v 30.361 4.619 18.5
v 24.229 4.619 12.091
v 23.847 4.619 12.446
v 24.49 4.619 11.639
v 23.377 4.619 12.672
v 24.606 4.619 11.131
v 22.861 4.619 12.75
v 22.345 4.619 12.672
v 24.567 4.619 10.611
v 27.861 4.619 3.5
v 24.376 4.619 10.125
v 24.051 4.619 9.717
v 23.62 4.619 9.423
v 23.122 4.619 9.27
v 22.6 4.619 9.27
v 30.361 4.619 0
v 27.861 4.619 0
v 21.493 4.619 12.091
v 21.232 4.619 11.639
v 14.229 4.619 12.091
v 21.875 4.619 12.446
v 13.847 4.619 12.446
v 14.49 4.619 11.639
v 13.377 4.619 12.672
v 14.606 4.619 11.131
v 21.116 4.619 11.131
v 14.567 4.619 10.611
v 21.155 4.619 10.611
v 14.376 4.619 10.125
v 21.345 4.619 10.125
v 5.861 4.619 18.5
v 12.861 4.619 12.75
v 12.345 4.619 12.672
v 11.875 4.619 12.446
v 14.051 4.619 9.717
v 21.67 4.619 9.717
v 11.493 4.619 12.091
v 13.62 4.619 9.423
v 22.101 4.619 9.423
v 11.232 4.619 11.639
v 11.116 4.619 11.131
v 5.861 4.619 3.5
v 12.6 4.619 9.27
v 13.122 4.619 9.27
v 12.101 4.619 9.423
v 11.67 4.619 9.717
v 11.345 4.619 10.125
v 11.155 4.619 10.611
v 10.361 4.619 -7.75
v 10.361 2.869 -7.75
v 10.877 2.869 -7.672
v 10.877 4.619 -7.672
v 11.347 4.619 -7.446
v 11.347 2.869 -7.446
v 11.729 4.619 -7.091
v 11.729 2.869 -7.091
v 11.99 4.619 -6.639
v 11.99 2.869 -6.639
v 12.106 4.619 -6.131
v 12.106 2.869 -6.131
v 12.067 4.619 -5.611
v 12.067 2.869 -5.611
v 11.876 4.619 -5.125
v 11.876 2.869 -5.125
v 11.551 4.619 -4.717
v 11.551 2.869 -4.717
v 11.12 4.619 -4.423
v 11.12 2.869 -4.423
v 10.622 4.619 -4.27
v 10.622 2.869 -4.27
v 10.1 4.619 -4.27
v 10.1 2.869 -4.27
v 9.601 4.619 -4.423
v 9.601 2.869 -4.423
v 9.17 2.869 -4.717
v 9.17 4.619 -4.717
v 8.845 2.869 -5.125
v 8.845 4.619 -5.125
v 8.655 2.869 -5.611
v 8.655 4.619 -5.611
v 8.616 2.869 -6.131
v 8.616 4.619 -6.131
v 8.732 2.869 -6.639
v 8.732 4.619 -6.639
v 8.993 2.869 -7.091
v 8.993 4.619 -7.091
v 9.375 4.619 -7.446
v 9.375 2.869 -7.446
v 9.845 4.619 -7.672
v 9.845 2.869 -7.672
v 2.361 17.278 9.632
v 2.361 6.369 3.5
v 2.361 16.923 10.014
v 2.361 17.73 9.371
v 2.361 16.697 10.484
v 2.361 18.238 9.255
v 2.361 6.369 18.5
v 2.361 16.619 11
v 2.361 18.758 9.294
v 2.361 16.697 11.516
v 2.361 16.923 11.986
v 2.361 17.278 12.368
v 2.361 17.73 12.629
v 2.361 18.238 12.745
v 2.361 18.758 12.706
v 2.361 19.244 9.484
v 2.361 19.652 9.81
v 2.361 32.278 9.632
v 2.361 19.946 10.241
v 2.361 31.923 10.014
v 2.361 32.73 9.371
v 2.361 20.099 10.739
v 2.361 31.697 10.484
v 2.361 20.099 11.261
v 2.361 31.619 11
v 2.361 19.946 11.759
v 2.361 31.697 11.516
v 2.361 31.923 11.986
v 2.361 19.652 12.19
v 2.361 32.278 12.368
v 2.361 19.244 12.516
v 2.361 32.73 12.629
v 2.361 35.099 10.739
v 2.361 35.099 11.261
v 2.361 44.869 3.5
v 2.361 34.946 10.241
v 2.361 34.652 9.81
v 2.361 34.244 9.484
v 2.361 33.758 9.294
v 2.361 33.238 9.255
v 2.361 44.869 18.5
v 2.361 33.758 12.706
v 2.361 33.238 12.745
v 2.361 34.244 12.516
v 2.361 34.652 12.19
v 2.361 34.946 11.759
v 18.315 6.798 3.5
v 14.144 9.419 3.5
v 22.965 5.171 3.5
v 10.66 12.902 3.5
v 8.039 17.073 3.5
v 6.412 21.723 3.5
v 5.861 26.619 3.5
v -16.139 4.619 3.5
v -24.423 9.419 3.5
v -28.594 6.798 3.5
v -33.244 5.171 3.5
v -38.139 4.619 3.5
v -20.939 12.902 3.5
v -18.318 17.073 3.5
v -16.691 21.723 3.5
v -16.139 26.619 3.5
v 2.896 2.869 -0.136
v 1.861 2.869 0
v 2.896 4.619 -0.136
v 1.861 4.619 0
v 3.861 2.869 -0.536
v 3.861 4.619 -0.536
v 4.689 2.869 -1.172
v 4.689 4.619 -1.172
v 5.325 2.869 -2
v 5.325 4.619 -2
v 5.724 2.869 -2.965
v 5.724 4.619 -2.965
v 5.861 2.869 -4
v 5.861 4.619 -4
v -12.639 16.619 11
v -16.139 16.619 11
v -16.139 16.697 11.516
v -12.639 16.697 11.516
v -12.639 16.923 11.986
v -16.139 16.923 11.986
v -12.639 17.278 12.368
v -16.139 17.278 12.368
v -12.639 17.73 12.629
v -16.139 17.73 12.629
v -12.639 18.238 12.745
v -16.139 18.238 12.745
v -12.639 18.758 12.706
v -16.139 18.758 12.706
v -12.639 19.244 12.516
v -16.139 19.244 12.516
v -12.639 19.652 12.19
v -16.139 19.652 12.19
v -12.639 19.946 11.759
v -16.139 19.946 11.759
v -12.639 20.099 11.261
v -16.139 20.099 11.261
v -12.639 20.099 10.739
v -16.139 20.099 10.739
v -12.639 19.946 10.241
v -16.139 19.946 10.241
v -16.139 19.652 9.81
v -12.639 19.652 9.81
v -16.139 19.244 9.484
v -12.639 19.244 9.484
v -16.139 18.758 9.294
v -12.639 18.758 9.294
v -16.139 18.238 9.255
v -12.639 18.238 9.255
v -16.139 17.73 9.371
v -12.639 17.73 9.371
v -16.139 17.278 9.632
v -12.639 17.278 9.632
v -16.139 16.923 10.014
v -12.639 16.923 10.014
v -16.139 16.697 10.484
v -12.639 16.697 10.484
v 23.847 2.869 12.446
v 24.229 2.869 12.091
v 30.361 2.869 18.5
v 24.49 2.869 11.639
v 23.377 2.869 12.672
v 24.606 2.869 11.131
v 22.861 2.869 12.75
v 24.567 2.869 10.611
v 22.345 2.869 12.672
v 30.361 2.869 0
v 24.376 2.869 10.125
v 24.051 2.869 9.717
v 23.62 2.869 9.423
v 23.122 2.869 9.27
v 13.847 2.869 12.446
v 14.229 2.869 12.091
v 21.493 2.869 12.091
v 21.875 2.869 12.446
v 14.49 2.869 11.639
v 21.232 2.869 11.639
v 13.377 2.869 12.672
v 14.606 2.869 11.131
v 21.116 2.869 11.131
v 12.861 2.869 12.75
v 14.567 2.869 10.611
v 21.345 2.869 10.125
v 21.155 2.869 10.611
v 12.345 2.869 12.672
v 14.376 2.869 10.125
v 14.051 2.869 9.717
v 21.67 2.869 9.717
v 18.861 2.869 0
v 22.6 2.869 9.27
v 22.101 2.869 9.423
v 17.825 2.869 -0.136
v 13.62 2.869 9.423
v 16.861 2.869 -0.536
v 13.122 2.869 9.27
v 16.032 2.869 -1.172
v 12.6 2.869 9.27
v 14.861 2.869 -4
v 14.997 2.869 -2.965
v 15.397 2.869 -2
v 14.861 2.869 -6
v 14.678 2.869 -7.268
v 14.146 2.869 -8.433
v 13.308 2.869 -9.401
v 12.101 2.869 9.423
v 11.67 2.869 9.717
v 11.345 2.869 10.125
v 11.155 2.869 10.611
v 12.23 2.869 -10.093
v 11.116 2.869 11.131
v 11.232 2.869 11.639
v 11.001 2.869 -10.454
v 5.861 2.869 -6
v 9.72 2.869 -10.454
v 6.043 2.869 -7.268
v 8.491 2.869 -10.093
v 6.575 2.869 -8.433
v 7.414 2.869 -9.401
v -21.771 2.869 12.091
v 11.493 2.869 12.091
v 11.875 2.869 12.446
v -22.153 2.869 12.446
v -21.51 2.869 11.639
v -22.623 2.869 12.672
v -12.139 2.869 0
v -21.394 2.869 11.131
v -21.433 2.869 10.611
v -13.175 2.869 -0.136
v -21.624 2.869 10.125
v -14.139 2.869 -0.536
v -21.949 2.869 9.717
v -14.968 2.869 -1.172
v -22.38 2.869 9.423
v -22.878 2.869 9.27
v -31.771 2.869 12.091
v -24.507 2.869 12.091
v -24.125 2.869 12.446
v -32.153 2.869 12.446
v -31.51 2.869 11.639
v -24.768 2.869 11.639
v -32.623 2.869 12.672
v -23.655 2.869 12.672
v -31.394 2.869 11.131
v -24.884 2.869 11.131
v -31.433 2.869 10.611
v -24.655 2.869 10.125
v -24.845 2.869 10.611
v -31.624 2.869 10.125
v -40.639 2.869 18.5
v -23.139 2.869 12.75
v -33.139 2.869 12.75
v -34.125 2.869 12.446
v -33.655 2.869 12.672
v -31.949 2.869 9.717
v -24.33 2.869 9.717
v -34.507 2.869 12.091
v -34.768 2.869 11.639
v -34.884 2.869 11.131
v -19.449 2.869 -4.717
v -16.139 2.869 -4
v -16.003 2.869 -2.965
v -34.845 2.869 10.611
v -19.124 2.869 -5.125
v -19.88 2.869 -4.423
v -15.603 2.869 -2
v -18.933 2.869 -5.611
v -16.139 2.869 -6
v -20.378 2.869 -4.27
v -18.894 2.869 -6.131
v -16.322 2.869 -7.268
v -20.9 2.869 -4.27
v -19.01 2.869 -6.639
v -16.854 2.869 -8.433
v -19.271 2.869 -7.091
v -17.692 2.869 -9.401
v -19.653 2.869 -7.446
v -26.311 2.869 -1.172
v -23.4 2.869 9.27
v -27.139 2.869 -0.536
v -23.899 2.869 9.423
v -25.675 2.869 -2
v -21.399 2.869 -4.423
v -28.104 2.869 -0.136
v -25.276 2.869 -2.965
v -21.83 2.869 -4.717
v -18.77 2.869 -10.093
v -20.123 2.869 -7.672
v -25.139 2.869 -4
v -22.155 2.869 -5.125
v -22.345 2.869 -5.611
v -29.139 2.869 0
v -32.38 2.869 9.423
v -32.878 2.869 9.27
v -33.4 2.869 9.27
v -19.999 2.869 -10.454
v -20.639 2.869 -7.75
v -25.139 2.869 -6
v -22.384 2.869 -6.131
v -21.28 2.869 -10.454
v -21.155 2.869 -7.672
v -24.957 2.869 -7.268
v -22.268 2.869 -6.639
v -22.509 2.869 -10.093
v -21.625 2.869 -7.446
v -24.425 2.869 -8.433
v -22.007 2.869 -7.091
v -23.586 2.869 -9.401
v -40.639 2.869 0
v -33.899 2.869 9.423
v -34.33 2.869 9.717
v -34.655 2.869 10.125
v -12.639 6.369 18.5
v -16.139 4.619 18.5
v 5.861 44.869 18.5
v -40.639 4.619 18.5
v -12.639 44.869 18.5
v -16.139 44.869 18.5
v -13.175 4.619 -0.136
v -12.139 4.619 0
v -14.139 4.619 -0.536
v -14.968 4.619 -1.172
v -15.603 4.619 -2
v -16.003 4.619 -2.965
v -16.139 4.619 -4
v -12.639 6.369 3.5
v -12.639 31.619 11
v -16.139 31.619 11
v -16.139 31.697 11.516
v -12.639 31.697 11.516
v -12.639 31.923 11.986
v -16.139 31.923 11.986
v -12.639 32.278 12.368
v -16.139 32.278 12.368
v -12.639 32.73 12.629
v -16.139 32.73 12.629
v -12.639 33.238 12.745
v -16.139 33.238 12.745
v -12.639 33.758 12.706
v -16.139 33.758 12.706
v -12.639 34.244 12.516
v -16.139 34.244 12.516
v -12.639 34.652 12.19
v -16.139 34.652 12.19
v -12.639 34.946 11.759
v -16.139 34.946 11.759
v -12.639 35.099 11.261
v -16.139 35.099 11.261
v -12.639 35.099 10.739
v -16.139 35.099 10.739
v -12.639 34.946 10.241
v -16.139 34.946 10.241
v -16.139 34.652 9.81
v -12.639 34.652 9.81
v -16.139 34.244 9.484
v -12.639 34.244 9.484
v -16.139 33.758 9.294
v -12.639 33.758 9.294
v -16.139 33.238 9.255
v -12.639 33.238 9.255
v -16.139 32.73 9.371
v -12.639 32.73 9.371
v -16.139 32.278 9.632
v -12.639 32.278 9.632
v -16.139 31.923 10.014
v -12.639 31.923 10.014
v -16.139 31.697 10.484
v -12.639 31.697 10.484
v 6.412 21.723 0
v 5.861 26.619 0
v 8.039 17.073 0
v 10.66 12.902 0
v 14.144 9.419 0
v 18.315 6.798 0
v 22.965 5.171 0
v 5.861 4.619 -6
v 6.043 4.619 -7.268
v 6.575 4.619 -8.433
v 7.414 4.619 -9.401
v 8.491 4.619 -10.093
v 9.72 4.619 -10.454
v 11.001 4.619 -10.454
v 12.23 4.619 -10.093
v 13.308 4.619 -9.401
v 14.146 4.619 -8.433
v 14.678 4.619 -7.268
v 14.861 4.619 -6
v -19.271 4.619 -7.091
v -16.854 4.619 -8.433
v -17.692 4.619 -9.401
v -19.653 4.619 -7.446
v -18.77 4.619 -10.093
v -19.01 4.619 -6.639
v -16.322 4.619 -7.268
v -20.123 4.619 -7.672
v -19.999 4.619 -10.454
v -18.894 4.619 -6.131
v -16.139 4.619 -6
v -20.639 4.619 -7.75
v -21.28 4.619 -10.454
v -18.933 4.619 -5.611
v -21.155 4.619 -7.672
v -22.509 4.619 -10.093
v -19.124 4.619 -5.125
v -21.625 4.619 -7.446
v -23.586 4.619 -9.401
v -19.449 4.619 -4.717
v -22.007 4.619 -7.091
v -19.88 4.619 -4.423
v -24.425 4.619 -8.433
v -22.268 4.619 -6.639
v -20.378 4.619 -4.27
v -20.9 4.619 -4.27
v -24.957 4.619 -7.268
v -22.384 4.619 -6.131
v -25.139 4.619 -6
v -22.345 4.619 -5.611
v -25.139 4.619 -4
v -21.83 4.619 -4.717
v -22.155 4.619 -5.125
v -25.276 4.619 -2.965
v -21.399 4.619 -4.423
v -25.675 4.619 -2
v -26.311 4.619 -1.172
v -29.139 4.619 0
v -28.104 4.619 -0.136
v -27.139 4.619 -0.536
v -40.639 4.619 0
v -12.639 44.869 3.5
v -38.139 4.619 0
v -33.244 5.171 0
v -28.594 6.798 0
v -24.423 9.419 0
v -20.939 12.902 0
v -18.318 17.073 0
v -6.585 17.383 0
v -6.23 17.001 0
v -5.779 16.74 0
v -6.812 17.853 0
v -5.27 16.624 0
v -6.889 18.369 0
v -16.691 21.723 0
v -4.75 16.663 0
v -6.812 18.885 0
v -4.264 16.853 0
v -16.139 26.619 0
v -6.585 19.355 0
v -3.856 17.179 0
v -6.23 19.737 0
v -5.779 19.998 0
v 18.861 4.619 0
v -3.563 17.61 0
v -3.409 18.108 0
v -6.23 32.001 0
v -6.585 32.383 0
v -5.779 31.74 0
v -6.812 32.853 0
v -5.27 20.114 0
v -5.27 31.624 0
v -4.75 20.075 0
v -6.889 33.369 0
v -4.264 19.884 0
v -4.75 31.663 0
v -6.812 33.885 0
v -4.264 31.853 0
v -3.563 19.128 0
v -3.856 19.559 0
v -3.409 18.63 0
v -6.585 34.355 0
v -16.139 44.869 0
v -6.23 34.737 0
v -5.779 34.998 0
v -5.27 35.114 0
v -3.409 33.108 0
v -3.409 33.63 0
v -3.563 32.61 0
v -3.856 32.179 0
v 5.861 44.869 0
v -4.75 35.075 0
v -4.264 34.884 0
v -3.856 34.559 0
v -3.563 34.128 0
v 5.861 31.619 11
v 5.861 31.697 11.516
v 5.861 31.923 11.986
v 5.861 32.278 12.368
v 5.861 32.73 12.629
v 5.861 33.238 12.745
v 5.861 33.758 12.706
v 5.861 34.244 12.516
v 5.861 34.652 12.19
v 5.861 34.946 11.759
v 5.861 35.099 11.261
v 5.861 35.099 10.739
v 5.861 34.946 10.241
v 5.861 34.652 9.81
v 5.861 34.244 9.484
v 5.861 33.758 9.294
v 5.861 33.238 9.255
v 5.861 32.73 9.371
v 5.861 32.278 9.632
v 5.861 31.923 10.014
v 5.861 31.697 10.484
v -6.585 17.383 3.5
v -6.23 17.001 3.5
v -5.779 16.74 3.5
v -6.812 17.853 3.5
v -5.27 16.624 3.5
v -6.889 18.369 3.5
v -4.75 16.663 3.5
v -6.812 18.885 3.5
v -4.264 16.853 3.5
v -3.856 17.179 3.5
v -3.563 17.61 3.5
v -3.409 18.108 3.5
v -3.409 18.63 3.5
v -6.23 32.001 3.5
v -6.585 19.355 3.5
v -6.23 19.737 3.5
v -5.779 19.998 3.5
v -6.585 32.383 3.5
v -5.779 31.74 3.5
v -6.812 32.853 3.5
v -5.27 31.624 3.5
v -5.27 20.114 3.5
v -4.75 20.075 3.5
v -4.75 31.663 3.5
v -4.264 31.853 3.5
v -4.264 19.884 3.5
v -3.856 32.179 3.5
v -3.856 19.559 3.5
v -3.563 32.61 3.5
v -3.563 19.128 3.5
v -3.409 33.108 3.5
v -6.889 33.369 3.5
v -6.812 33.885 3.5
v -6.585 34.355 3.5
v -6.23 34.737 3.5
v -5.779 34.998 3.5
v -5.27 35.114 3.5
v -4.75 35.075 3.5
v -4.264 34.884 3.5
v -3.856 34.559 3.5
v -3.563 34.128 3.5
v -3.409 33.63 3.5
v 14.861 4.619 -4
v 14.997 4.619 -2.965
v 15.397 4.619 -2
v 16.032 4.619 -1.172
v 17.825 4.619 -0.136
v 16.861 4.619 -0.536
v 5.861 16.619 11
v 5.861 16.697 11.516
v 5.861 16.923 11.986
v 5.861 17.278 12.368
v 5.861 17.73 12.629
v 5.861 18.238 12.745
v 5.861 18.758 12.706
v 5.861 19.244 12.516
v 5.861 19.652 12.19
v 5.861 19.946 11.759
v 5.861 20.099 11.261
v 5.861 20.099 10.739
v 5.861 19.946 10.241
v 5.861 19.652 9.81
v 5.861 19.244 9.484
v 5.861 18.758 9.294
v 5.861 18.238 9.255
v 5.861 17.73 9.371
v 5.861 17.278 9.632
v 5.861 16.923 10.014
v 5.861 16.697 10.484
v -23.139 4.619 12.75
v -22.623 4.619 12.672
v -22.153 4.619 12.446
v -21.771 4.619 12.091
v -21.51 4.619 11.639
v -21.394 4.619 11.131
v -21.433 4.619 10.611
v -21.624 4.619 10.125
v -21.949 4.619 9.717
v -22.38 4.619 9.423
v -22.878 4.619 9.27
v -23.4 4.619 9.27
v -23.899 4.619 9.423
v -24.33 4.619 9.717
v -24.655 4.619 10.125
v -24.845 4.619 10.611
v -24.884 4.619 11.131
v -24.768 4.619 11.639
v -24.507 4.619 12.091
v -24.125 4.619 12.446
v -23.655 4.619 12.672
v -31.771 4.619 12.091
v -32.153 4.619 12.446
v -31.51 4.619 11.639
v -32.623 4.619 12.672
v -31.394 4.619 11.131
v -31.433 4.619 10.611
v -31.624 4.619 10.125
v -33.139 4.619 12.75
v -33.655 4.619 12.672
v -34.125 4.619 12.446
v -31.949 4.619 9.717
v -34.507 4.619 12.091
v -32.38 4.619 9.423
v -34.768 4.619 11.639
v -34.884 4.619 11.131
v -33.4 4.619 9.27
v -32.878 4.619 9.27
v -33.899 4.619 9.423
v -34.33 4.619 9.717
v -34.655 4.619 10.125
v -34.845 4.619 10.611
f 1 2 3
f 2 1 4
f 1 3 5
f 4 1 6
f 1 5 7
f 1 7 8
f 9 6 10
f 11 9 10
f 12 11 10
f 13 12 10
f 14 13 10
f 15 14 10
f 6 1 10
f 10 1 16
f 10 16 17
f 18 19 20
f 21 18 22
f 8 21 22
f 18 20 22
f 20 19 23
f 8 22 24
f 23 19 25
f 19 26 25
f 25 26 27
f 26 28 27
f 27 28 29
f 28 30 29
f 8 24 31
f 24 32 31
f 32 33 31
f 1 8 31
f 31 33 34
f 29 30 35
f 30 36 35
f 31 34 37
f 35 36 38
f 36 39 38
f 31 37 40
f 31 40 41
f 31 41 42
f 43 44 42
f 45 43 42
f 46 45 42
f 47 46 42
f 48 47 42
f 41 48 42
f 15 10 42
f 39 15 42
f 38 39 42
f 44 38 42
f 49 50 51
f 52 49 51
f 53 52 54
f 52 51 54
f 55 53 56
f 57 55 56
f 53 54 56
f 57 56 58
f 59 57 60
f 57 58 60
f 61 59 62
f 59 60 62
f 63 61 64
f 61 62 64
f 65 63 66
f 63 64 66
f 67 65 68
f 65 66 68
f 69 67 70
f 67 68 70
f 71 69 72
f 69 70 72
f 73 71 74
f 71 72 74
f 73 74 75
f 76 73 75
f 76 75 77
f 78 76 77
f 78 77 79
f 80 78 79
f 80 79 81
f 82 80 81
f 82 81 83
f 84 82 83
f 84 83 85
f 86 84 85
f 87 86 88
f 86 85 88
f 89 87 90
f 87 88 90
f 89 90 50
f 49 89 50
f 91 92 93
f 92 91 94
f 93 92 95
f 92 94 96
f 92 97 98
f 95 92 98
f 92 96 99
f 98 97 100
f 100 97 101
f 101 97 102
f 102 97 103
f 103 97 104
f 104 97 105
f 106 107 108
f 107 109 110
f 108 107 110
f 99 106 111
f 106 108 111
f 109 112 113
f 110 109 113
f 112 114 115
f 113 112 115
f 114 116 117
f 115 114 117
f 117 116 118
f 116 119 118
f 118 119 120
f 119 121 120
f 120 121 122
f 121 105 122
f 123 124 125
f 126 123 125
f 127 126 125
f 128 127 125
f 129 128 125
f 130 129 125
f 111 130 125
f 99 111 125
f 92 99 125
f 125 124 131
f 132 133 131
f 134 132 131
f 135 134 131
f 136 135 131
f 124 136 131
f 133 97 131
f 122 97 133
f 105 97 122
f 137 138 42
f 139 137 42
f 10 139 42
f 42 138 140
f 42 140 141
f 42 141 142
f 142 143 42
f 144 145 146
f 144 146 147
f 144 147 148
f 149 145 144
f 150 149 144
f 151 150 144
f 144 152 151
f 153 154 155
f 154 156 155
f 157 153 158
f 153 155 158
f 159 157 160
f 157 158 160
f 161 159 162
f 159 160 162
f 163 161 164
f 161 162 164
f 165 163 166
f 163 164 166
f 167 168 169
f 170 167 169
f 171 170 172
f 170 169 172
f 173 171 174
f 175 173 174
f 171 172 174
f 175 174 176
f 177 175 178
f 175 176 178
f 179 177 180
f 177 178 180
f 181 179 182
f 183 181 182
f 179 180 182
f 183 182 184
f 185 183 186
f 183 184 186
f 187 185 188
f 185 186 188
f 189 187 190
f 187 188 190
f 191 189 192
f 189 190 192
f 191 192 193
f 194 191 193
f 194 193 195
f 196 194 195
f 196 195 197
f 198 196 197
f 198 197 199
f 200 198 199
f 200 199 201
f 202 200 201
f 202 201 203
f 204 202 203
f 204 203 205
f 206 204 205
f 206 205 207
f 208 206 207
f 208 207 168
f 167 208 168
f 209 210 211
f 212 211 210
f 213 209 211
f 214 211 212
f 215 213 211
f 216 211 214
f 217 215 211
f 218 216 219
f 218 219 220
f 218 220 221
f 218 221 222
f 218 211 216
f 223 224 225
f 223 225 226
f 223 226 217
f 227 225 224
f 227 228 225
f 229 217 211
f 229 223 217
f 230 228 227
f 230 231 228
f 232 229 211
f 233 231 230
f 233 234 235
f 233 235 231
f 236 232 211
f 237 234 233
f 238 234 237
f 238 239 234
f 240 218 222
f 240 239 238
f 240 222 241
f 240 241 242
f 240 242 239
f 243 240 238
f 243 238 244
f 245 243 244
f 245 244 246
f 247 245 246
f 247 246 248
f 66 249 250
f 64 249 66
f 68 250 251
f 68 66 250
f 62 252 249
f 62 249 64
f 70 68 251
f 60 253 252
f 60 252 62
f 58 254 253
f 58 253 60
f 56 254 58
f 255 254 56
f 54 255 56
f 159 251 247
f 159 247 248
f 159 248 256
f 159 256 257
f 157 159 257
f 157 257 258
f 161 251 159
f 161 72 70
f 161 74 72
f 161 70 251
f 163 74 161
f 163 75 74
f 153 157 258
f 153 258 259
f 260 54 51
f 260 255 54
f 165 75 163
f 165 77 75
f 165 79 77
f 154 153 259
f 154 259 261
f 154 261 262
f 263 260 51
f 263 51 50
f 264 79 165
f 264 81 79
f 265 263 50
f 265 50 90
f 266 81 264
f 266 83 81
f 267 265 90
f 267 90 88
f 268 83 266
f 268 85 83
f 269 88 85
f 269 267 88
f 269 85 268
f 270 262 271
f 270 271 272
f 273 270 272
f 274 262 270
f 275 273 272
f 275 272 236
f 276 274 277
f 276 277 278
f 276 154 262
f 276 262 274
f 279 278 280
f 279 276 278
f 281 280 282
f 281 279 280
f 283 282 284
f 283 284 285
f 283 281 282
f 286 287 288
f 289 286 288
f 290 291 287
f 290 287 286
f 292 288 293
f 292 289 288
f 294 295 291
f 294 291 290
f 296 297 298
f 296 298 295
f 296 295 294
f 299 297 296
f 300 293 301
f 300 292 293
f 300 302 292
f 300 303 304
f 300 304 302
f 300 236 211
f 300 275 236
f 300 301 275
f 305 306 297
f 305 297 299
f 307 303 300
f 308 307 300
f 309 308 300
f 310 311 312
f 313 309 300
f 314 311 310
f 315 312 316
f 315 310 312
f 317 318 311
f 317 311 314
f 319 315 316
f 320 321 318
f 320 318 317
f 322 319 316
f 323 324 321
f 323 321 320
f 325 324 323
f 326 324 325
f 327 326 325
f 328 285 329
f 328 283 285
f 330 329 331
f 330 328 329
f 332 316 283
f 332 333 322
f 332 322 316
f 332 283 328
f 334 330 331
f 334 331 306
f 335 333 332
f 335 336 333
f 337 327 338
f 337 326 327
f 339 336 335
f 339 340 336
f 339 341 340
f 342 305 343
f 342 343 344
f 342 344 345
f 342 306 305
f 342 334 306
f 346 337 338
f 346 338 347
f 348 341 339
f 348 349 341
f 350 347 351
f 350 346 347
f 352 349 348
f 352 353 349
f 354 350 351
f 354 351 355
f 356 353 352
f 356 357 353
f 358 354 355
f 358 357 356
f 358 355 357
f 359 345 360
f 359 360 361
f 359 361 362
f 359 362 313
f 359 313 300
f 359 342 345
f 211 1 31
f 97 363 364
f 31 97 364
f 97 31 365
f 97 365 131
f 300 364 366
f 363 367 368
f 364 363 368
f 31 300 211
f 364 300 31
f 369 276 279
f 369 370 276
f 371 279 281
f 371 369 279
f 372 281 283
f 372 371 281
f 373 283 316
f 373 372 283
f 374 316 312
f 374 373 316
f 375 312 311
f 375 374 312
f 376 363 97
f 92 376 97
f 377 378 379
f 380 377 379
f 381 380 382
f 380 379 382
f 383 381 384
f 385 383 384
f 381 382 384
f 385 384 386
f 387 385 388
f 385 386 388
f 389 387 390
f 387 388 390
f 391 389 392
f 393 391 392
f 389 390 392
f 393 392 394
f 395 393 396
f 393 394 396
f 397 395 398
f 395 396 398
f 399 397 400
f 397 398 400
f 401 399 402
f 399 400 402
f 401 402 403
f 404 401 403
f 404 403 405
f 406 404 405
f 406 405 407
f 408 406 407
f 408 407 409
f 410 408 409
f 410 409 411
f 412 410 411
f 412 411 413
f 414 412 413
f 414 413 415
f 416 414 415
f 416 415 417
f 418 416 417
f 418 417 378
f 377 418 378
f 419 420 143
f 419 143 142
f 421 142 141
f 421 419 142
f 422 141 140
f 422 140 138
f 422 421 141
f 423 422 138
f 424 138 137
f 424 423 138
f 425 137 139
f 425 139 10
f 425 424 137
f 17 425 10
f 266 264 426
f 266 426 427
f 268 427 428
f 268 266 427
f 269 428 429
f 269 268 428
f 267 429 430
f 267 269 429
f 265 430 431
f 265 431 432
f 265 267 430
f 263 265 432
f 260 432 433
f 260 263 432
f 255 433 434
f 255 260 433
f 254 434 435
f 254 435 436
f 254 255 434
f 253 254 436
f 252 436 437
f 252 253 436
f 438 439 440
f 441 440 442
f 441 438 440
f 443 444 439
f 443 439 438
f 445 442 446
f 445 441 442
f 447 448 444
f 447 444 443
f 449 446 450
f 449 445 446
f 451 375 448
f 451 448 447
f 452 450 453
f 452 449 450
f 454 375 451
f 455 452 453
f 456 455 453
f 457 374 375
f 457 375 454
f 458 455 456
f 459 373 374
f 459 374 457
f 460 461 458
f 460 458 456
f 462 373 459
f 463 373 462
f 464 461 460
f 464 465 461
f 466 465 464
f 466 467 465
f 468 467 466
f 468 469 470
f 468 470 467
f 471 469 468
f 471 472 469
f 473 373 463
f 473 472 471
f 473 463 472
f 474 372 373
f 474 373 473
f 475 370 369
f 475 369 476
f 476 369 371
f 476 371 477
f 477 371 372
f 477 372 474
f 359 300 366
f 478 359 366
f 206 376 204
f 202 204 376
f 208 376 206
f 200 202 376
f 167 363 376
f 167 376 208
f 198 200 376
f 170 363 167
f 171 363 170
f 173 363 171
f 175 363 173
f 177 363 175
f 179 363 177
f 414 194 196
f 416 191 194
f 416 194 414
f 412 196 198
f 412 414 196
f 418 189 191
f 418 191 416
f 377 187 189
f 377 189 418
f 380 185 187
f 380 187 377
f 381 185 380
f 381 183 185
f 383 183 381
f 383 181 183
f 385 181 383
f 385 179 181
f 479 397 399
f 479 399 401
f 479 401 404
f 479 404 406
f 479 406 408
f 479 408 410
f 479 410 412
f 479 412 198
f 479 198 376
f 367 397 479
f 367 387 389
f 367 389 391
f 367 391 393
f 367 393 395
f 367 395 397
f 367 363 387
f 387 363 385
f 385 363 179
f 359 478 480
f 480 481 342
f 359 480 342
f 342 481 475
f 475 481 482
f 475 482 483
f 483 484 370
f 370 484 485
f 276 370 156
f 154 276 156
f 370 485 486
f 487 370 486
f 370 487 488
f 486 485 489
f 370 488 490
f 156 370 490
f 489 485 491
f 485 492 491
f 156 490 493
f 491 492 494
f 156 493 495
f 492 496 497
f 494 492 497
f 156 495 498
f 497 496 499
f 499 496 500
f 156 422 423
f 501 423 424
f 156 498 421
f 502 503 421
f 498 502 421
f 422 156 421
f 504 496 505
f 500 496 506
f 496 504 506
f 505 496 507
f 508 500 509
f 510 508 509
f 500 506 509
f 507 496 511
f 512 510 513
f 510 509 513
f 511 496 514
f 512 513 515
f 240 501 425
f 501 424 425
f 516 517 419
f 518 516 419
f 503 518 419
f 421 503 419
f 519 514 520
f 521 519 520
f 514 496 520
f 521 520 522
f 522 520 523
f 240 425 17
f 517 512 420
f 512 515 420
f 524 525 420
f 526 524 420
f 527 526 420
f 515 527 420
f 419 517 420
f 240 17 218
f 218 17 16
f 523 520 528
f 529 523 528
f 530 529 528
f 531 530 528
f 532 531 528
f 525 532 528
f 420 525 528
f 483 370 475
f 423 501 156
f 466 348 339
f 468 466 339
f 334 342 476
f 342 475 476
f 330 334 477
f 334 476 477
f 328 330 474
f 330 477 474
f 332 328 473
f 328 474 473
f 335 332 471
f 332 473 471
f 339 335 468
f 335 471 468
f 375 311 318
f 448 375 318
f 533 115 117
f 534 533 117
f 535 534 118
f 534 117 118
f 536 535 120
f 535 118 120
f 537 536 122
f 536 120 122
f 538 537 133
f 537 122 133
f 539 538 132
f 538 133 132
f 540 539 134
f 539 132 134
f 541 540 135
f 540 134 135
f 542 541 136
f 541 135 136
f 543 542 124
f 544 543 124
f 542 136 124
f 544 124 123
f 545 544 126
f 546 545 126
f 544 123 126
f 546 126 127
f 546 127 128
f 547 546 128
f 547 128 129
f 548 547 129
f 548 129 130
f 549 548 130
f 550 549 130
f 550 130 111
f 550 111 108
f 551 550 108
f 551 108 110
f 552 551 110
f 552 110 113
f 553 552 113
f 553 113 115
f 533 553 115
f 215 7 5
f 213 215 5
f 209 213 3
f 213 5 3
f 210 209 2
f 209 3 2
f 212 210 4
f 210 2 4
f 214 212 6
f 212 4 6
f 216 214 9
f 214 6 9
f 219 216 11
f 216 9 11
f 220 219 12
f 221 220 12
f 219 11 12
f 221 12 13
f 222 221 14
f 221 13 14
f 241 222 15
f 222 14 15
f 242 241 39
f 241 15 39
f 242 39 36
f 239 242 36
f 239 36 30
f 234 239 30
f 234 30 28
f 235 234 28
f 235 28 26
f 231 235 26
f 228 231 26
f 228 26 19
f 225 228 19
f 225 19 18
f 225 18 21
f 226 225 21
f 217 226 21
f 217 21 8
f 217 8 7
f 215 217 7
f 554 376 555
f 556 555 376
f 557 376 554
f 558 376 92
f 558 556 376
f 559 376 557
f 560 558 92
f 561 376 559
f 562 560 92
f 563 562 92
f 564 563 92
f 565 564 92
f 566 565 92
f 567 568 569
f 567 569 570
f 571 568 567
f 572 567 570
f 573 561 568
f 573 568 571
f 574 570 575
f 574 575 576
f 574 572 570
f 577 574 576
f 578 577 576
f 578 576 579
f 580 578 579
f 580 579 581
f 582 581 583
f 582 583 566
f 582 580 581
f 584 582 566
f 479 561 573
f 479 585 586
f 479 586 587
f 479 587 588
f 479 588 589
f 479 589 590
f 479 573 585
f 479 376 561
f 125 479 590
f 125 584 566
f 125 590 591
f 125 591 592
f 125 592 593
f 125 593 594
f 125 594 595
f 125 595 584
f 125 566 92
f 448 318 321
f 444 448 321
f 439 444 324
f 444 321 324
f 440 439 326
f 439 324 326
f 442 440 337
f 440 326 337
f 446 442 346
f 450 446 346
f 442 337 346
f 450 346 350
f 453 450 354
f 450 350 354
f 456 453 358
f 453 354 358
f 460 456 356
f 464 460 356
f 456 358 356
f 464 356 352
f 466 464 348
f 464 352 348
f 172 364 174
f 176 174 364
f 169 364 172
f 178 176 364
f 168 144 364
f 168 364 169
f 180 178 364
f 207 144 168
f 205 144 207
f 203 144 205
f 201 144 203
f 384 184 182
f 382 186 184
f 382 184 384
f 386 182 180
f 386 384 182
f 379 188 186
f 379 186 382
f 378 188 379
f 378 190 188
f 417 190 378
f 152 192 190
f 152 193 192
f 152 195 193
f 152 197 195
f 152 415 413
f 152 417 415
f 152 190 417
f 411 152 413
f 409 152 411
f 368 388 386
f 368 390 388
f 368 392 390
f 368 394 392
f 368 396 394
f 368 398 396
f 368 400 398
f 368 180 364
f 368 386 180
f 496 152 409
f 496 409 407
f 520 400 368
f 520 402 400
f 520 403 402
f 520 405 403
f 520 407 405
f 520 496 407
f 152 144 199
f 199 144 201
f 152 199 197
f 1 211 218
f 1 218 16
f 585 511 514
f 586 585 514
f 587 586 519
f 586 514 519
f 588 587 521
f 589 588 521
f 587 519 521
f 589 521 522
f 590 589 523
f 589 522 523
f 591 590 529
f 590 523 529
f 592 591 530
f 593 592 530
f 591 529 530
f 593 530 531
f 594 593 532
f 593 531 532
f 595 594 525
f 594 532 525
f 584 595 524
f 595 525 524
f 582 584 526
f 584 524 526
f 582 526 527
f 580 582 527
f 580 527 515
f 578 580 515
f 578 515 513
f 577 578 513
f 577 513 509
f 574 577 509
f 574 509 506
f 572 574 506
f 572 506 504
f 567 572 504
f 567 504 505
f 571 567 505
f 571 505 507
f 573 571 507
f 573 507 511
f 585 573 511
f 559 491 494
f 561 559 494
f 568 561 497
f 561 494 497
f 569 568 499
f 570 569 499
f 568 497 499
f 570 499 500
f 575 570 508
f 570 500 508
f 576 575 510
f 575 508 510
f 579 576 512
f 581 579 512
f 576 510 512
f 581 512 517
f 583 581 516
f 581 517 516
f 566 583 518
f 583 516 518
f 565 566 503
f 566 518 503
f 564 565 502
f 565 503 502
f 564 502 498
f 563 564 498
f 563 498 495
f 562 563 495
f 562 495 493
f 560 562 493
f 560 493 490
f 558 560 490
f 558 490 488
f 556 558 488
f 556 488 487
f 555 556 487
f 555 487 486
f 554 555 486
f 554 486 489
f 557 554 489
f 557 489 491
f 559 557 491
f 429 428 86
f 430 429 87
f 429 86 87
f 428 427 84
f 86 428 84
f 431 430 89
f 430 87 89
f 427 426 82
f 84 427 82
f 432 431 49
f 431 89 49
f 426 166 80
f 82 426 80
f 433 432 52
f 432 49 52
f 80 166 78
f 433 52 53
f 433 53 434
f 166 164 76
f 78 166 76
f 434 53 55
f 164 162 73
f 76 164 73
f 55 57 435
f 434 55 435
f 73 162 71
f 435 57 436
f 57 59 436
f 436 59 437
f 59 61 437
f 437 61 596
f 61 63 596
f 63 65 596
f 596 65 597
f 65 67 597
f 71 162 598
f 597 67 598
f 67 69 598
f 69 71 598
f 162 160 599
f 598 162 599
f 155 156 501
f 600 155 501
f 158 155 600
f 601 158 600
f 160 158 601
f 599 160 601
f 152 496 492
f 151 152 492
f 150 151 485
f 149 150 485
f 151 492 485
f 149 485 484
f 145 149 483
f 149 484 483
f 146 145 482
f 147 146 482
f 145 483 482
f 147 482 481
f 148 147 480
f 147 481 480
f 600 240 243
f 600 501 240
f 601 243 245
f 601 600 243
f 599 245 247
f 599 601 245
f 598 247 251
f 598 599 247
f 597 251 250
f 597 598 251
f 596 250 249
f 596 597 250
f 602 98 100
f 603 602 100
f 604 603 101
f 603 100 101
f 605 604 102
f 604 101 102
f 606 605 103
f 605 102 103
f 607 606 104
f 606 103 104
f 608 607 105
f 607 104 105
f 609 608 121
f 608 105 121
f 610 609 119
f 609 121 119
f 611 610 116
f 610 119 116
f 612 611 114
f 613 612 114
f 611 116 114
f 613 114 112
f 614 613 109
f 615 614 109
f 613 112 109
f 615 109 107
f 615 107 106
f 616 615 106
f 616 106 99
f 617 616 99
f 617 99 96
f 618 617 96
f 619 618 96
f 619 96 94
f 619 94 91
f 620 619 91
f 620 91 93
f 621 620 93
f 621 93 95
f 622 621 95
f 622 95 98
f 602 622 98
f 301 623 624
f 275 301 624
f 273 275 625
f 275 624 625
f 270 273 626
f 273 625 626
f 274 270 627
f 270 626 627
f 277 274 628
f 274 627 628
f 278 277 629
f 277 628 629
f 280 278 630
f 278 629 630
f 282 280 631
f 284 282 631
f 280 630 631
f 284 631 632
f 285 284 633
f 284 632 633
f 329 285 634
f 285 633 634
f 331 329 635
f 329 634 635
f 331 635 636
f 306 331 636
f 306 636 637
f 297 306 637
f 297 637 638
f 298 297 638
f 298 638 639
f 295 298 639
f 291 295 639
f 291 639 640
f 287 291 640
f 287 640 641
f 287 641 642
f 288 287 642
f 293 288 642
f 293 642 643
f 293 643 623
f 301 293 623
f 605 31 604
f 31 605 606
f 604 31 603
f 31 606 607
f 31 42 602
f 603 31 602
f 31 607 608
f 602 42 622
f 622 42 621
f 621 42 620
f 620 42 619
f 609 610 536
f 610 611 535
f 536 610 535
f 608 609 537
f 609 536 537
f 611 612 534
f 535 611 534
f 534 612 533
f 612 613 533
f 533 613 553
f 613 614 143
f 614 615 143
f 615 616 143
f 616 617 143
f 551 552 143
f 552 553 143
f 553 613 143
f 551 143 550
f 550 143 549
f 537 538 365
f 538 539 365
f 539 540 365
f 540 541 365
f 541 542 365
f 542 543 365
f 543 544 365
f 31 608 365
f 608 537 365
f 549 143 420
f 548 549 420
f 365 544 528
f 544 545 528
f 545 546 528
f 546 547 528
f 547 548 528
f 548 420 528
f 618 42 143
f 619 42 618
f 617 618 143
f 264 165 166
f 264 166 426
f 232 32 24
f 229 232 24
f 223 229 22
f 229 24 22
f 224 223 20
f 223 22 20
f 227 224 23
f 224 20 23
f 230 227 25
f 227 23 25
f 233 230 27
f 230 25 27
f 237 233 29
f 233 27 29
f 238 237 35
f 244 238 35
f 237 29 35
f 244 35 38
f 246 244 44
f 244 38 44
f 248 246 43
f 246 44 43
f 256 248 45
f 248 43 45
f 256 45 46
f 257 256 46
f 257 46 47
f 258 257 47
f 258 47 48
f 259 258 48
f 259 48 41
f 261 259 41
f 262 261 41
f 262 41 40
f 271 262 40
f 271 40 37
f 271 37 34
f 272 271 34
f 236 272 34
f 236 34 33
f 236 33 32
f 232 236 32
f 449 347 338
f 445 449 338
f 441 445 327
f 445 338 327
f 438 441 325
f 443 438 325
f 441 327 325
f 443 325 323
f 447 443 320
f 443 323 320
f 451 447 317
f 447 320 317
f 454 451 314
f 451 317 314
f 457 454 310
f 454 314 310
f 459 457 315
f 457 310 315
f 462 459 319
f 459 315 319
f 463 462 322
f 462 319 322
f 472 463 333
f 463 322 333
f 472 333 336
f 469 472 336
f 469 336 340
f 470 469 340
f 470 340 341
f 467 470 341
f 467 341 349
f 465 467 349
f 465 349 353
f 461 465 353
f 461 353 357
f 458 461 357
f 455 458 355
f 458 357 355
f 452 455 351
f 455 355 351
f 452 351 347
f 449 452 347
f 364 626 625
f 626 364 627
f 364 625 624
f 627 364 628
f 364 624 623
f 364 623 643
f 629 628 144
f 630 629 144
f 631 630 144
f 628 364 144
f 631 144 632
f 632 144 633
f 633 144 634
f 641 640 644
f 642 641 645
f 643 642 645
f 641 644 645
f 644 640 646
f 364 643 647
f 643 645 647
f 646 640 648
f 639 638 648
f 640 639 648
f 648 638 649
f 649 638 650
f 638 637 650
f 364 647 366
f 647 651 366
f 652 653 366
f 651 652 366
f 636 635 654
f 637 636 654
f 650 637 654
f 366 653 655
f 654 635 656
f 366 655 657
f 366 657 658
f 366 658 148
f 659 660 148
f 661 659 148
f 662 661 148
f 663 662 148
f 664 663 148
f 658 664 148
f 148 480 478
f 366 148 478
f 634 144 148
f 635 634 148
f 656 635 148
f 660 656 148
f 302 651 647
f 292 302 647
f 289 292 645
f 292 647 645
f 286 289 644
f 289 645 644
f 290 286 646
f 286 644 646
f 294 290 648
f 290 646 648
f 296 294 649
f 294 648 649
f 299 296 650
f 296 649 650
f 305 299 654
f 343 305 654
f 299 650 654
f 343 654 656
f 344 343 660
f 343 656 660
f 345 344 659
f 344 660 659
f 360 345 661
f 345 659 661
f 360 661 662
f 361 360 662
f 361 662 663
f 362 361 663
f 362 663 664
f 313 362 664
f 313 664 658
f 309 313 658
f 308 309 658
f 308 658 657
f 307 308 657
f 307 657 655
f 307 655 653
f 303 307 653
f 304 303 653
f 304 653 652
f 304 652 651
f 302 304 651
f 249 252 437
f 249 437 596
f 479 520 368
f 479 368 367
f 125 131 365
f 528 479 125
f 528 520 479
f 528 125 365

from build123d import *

# Parameters (mm, degrees)
SKETCH1_W           = 22
SKETCH1_H           = 42
BOSS_EXTRUDE1_DEPTH = 18.5
SKETCH2_W           = 15
SKETCH2_H           = 38.5
CUT_EXTRUDE1_DEPTH  = 15
SKETCH3_W           = 24.5
SKETCH3_H           = 1.75
BOSS_EXTRUDE2_DEPTH = 18.5
BOSS_EXTRUDE3_DEPTH = 3.5
SKETCH5_R           = 1.75
BOSS_EXTRUDE4_DEPTH = 1.75
SKETCH6_R           = 1.75
CUT_EXTRUDE2_DEPTH  = 10
FILLET1_R           = 4
SKETCH7_R           = 1.75
CUT_EXTRUDE3_DEPTH  = 28
SKETCH8_R           = 1.75
CUT_EXTRUDE4_DEPTH  = 28


with BuildPart() as part:
    # Sketch1 → Boss-Extrude1 (new body)
    with BuildSketch(Plane.XY):
        with Locations((-5.139289452, 23.868914656)):
            Rectangle(SKETCH1_W, SKETCH1_H)
    extrude(amount=BOSS_EXTRUDE1_DEPTH)

    # Sketch2 → Cut-Extrude1 (cut)
    with BuildSketch(Plane.XY.offset(18.5)):
        with Locations((-5.139289452, 25.618914656)):
            Rectangle(SKETCH2_W, SKETCH2_H)
    extrude(amount=-CUT_EXTRUDE1_DEPTH, mode=Mode.SUBTRACT)

    # Sketch3 → Boss-Extrude2 (add)
    with BuildSketch(Plane(origin=(0, 0, 0), x_dir=(-1, 0, 0), z_dir=(0, 0, -1))):
        with Locations((28.389289452, 3.743914656)):
            Rectangle(SKETCH3_W, SKETCH3_H)
        with Locations((-18.110710548, 3.743914656)):
            Rectangle(SKETCH3_W, SKETCH3_H)
    extrude(amount=-BOSS_EXTRUDE2_DEPTH)

    # Sketch4 → Boss-Extrude3 (add)
    with BuildSketch(Plane(origin=(0, 0, 0), x_dir=(-1, 0, 0), z_dir=(0, 0, -1))):
        with BuildLine():
            Line((38.139289452, 4.618914656), (16.139289452, 4.618914656))
            Line((16.139289452, 4.618914656), (16.139289452, 26.618914656))
            ThreePointArc((16.139289452, 26.618914656), (22.582940266, 11.06256547), (38.139289452, 4.618914656))
        make_face()
        with BuildLine():
            Line((-27.860710548, 4.618914656), (-5.860710548, 4.618914656))
            Line((-5.860710548, 4.618914656), (-5.860710548, 26.618914656))
            ThreePointArc((-5.860710548, 26.618914656), (-12.304361361, 11.06256547), (-27.860710548, 4.618914656))
        make_face()
    extrude(amount=-BOSS_EXTRUDE3_DEPTH)

    # Sketch5 → Boss-Extrude4 (add)
    # profile 1 of 2: a face of its own
    with BuildSketch(Plane.XZ.offset(-2.868914656)):
        with BuildLine():
            Line((14.860710548, -6), (14.860710548, 0))
            Line((14.860710548, 0), (5.860710548, 0))
            Line((5.860710548, 0), (5.860710548, -6))
            ThreePointArc((5.860710548, -6), (10.360710548, -10.5), (14.860710548, -6))
        make_face()
        with Locations(Location((10.360710548, -6, 0), (0, 0, 270))):
            Circle(SKETCH5_R, mode=Mode.SUBTRACT)
    # profile 2 of 2: a face of its own
    with BuildSketch(Plane.XZ.offset(-2.868914656)):
        with BuildLine():
            Line((-25.139289452, -6), (-25.139289452, 0))
            Line((-25.139289452, 0), (-16.139289452, 0))
            Line((-16.139289452, 0), (-16.139289452, -6))
            ThreePointArc((-16.139289452, -6), (-20.639289452, -10.5), (-25.139289452, -6))
        make_face()
        with Locations(Location((-20.639289452, -6, 0), (0, 0, 270))):
            Circle(SKETCH5_R, mode=Mode.SUBTRACT)
    extrude(amount=-BOSS_EXTRUDE4_DEPTH)

    # Sketch6 → Cut-Extrude2 (cut)
    with BuildSketch(Plane(origin=(0, 4.618914656, 0), x_dir=(1, 0, 0), z_dir=(0, 1, 0))):
        with Locations(Location((22.860710548, -11, 0), (0, 0, 270))):
            Circle(SKETCH6_R)
        with Locations(Location((-33.139289452, -11, 0), (0, 0, 270))):
            Circle(SKETCH6_R)
        with Locations(Location((12.860710548, -11, 0), (0, 0, 270))):
            Circle(SKETCH6_R)
        with Locations(Location((-23.139289452, -11, 0), (0, 0, 270))):
            Circle(SKETCH6_R)
    extrude(amount=-CUT_EXTRUDE2_DEPTH, mode=Mode.SUBTRACT)

    # Fillet1
    fillet1_edges = [part.edges().sort_by_distance(p)[0] for p in [
        (14.860710548, 3.743914656, 0),
        (5.860710548, 3.743914656, 0),
        (-25.139289452, 3.743914656, 0),
        (-16.139289452, 3.743914656, 0),
    ]]
    fillet(fillet1_edges, radius=FILLET1_R)

    # Sketch7 → Cut-Extrude3 (cut)
    with BuildSketch(Plane.ZY.offset(16.139289452)):
        with Locations(Location((11, 33.368914656, 0), (0, 0, 270))):
            Circle(SKETCH7_R)
        with Locations(Location((11, 18.368914656, 0), (0, 0, 270))):
            Circle(SKETCH7_R)
    extrude(amount=-CUT_EXTRUDE3_DEPTH, mode=Mode.SUBTRACT)

    # Sketch8 → Cut-Extrude4 (cut)
    with BuildSketch(Plane(origin=(0, 0, 0), x_dir=(-1, 0, 0), z_dir=(0, 0, -1))):
        with Locations((5.139289452, 33.368914656)):
            Circle(SKETCH8_R)
        with Locations((5.139289452, 18.368914656)):
            Circle(SKETCH8_R)
    extrude(amount=-CUT_EXTRUDE4_DEPTH, mode=Mode.SUBTRACT)


solid = part.part
